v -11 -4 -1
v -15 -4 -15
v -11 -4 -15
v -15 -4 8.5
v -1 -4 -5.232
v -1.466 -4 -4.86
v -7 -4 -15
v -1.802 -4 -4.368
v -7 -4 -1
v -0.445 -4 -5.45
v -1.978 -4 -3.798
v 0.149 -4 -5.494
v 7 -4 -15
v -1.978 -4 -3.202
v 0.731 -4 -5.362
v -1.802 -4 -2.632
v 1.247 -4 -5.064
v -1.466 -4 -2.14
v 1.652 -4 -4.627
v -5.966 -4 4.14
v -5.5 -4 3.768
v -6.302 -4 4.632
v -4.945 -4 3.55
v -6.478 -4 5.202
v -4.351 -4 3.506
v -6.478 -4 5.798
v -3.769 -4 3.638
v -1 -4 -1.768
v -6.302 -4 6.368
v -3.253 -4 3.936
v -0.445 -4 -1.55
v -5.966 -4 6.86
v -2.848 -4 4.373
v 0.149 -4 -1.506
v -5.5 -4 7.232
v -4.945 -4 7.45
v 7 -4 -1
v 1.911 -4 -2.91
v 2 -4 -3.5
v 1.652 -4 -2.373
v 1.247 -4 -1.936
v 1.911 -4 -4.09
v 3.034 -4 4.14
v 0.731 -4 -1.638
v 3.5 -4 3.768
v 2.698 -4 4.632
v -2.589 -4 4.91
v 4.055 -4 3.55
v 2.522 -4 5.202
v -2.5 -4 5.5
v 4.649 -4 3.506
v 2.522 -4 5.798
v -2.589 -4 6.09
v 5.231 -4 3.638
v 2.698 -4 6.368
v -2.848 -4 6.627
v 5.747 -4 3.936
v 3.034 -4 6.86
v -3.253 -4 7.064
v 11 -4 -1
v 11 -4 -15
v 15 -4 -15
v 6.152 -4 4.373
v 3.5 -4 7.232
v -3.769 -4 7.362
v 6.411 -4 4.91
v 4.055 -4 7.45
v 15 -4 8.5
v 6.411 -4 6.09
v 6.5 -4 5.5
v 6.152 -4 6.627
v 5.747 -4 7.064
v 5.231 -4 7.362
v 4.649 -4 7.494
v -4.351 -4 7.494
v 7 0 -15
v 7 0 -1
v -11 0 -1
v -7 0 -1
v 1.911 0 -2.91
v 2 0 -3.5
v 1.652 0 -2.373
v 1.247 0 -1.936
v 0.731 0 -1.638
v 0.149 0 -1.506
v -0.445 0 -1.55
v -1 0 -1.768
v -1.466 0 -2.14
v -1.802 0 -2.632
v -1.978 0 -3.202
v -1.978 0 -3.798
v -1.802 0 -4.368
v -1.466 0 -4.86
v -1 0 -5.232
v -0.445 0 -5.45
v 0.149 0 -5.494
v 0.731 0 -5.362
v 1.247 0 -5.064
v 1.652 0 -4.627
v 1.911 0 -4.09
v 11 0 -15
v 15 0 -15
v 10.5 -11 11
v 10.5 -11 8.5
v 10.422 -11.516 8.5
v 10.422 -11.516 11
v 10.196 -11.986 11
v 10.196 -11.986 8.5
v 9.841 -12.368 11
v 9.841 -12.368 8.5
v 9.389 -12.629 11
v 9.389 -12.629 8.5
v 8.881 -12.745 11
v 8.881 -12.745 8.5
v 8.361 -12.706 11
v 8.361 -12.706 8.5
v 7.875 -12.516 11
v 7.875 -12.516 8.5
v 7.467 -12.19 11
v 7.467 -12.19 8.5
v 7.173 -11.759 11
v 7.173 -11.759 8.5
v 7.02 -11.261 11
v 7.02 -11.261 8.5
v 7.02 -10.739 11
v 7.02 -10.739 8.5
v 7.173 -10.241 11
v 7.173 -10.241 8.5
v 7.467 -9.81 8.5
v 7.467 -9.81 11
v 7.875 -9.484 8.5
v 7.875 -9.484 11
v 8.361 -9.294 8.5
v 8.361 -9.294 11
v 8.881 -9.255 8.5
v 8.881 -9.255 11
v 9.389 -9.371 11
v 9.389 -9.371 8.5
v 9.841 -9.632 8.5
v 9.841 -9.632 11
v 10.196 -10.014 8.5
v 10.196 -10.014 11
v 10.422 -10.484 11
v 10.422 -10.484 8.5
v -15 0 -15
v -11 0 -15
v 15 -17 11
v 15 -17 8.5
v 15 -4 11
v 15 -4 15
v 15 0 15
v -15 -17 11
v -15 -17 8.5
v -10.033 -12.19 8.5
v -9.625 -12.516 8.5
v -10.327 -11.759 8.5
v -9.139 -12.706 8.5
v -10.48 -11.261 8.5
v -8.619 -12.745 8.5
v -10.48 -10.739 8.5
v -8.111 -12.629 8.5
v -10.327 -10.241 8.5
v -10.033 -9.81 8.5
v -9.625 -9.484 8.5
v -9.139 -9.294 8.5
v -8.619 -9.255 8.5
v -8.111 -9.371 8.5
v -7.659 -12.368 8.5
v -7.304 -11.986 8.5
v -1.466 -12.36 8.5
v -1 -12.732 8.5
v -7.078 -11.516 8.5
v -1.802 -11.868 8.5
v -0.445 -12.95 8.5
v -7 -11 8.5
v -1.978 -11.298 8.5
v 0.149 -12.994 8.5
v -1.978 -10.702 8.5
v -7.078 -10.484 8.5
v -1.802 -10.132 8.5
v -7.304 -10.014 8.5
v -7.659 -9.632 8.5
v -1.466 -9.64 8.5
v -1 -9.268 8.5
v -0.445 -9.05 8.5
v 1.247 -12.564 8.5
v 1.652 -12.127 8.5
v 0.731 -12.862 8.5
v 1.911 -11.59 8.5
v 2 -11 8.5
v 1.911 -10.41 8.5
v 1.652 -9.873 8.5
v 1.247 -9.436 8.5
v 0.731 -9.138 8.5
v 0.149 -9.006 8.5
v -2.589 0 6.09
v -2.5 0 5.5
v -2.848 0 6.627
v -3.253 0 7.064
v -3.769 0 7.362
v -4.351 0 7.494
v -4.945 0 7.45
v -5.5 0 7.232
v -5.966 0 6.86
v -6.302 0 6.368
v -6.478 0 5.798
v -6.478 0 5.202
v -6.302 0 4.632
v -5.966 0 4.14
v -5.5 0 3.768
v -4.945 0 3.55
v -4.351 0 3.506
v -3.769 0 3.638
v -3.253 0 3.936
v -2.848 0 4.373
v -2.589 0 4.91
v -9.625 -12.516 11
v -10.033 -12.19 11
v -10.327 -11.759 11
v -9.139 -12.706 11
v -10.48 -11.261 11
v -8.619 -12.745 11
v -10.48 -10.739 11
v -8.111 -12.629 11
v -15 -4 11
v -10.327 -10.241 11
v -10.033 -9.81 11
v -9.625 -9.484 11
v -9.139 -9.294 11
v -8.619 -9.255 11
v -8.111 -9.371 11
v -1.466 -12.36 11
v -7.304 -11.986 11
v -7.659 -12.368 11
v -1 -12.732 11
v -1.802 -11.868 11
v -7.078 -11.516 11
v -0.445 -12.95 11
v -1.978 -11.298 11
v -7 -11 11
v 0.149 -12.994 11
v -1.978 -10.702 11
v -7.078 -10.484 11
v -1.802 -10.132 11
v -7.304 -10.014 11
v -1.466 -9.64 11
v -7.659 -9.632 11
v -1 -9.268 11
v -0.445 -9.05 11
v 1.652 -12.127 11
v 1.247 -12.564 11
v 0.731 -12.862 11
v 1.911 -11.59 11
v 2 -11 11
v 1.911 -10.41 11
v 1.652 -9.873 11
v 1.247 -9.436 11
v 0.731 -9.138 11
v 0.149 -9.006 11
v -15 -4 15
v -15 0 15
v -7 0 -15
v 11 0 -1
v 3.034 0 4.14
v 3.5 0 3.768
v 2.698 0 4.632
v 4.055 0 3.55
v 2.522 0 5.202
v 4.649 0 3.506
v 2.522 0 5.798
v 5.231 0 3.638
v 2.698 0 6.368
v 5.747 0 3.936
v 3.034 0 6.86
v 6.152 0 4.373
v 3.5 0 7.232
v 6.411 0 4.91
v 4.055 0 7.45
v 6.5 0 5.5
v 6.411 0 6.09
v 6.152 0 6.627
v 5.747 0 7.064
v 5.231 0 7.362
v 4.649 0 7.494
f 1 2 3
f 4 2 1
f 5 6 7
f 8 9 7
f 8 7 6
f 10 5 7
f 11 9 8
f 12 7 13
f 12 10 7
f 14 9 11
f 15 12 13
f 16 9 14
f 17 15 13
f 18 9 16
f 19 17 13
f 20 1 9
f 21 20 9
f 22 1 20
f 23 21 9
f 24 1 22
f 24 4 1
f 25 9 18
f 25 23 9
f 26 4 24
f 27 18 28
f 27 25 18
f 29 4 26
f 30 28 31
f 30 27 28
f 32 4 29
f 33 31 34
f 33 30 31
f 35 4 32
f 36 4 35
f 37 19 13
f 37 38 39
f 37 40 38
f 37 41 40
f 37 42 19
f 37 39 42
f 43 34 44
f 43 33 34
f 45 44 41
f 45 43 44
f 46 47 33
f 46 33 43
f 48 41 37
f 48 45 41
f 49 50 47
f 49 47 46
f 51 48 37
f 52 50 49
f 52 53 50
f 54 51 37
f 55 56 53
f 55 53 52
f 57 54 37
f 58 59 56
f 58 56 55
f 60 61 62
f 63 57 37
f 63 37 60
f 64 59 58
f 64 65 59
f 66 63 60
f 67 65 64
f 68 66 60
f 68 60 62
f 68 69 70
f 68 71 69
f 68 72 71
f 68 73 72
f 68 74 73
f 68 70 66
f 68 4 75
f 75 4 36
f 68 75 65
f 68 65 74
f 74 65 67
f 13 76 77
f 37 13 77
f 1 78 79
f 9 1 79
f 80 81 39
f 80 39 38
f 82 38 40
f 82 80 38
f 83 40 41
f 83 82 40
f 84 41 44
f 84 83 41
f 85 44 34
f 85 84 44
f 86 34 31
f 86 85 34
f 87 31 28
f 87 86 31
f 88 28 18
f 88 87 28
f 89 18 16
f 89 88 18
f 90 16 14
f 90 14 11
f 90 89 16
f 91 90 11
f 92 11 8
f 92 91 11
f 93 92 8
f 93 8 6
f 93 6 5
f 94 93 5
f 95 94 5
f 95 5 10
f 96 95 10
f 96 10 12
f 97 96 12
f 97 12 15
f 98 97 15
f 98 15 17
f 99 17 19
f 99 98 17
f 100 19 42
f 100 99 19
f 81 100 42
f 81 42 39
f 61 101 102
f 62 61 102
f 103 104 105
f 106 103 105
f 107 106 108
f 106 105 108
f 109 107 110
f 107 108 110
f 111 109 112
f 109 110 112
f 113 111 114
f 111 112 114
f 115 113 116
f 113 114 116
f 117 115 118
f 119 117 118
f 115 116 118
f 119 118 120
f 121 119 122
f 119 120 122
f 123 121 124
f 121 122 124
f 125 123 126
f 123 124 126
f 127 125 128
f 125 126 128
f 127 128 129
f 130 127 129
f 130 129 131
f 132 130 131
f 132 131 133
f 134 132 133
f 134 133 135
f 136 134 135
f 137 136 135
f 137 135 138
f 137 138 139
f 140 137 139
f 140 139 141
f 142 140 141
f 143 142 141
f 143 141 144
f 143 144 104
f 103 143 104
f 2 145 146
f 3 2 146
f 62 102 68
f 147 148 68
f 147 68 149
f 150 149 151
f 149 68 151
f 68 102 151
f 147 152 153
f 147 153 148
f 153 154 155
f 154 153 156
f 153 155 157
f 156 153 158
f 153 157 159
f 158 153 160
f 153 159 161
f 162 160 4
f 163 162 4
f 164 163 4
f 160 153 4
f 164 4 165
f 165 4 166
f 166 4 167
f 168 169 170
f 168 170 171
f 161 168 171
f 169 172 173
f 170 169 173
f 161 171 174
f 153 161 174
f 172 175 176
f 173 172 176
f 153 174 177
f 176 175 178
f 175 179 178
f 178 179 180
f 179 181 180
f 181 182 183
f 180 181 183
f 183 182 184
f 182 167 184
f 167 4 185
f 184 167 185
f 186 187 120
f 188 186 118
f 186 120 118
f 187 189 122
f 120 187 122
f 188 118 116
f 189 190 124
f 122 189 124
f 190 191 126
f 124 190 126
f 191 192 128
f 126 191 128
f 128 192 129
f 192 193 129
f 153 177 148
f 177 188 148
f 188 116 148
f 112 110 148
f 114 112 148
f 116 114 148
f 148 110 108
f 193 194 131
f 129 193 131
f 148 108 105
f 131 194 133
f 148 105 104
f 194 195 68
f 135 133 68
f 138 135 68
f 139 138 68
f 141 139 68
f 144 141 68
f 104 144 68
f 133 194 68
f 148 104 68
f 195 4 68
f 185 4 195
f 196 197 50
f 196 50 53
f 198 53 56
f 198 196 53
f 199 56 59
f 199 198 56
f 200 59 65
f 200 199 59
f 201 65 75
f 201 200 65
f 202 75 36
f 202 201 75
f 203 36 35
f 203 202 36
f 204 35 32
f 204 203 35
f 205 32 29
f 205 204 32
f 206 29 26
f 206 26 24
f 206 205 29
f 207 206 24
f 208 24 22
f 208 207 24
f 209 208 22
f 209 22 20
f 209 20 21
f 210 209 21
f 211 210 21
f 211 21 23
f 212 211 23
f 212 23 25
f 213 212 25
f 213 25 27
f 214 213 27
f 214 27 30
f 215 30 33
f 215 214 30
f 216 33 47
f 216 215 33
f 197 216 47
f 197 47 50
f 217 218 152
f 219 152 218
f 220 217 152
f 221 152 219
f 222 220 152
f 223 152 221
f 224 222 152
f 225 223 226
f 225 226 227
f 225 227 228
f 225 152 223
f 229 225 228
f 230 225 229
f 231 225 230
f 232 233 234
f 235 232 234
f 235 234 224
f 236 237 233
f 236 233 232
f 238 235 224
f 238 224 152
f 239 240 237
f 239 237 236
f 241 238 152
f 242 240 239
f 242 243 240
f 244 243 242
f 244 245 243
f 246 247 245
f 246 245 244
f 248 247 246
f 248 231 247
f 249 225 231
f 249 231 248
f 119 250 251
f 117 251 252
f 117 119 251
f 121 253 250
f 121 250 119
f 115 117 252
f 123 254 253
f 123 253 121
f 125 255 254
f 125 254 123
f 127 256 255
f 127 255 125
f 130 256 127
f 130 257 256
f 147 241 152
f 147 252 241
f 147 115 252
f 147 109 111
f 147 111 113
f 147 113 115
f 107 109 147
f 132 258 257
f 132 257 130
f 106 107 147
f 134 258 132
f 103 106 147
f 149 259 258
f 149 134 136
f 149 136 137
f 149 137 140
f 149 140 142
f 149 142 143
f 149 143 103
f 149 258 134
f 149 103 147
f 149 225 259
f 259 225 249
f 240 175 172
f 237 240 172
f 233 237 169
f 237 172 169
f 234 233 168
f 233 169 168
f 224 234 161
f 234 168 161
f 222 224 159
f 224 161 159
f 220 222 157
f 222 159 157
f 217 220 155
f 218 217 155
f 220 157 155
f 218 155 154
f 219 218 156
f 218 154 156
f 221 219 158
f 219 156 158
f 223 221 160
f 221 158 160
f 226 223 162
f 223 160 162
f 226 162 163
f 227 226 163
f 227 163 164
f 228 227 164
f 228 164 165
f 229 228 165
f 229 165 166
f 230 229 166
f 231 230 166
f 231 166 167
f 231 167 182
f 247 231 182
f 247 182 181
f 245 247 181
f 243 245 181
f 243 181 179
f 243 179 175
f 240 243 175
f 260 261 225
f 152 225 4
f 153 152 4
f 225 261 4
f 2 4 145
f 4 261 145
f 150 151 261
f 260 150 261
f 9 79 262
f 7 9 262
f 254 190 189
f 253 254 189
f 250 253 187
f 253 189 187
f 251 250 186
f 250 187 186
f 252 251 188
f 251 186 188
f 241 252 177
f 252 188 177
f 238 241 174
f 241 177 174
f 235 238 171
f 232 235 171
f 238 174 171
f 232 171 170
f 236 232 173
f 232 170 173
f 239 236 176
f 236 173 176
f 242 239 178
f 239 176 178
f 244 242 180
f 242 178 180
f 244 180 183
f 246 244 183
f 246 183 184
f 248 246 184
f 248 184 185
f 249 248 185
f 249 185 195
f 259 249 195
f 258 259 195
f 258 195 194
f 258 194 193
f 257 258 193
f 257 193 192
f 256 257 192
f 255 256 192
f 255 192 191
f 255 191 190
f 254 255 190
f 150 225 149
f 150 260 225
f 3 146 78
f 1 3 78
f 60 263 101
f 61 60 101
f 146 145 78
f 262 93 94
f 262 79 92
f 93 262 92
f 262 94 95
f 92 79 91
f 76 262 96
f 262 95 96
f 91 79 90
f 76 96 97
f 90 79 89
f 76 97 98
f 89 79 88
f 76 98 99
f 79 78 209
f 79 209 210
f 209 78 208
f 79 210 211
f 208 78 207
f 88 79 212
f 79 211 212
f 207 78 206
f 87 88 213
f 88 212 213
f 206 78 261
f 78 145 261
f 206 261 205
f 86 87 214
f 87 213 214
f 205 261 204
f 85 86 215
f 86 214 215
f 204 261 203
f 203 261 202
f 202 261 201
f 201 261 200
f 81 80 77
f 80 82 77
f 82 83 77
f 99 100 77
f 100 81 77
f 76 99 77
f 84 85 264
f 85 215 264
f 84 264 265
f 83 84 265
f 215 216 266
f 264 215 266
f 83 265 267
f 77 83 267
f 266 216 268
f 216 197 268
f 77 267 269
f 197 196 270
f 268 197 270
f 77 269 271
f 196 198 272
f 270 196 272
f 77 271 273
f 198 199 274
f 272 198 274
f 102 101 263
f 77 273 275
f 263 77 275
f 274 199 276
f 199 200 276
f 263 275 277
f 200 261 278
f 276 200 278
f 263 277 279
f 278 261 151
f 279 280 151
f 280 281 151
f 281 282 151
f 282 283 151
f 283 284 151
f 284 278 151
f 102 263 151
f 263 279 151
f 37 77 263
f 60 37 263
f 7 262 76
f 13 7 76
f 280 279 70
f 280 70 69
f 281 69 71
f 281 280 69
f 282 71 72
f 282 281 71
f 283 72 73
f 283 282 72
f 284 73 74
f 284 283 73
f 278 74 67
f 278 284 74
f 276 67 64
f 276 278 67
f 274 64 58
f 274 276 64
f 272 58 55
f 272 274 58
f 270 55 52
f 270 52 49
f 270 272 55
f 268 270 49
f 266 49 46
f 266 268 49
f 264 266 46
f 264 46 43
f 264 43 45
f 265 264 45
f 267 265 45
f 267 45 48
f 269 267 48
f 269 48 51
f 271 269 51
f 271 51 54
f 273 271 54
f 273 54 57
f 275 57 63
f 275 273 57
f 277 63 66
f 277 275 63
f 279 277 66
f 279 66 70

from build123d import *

# Parameters (mm, degrees)
F0_R     = 2
F1_DEPTH = 4
F2_W     = 30
F2_H     = 2.5
F3_DEPTH = 13
F4_R     = 1.75
F4_R_2   = 2
F5_DEPTH = 25


with BuildPart() as f1:
    # F0 (on Front) → F1 (new body)
    with BuildSketch(Plane.XZ):
        Polygon((11, -15), (15, -15), (15, 15), (-15, 15), (-15, -15), (-11, -15), (-11, -1), (-7, -1), (-7, -15), (7, -15), (7, -1), (11, -1), align=None)
        with Locations((0, -3.5)):
            Circle(F0_R, mode=Mode.SUBTRACT)
        with Locations((-4.5, 5.5)):
            Circle(F0_R, mode=Mode.SUBTRACT)
        with Locations((4.5, 5.5)):
            Circle(F0_R, mode=Mode.SUBTRACT)
    extrude(amount=F1_DEPTH)

    # F2 (on face) → F3 (join)
    with BuildSketch(Plane.XZ.offset(4)):
        with Locations((0, 9.75)):
            Rectangle(F2_W, F2_H)
    extrude(amount=F3_DEPTH)

    # F4 (on face) → F5 (cut)
    with BuildSketch(Plane(origin=(0, 0, 8.5), x_dir=(1, 0, 0), z_dir=(0, 0, -1))):
        with Locations((-8.75, 11)):
            Circle(F4_R)
        with Locations((0, 11)):
            Circle(F4_R_2)
        with Locations((8.75, 11)):
            Circle(F4_R)
    extrude(amount=-F5_DEPTH, mode=Mode.SUBTRACT)


solid = f1.part
